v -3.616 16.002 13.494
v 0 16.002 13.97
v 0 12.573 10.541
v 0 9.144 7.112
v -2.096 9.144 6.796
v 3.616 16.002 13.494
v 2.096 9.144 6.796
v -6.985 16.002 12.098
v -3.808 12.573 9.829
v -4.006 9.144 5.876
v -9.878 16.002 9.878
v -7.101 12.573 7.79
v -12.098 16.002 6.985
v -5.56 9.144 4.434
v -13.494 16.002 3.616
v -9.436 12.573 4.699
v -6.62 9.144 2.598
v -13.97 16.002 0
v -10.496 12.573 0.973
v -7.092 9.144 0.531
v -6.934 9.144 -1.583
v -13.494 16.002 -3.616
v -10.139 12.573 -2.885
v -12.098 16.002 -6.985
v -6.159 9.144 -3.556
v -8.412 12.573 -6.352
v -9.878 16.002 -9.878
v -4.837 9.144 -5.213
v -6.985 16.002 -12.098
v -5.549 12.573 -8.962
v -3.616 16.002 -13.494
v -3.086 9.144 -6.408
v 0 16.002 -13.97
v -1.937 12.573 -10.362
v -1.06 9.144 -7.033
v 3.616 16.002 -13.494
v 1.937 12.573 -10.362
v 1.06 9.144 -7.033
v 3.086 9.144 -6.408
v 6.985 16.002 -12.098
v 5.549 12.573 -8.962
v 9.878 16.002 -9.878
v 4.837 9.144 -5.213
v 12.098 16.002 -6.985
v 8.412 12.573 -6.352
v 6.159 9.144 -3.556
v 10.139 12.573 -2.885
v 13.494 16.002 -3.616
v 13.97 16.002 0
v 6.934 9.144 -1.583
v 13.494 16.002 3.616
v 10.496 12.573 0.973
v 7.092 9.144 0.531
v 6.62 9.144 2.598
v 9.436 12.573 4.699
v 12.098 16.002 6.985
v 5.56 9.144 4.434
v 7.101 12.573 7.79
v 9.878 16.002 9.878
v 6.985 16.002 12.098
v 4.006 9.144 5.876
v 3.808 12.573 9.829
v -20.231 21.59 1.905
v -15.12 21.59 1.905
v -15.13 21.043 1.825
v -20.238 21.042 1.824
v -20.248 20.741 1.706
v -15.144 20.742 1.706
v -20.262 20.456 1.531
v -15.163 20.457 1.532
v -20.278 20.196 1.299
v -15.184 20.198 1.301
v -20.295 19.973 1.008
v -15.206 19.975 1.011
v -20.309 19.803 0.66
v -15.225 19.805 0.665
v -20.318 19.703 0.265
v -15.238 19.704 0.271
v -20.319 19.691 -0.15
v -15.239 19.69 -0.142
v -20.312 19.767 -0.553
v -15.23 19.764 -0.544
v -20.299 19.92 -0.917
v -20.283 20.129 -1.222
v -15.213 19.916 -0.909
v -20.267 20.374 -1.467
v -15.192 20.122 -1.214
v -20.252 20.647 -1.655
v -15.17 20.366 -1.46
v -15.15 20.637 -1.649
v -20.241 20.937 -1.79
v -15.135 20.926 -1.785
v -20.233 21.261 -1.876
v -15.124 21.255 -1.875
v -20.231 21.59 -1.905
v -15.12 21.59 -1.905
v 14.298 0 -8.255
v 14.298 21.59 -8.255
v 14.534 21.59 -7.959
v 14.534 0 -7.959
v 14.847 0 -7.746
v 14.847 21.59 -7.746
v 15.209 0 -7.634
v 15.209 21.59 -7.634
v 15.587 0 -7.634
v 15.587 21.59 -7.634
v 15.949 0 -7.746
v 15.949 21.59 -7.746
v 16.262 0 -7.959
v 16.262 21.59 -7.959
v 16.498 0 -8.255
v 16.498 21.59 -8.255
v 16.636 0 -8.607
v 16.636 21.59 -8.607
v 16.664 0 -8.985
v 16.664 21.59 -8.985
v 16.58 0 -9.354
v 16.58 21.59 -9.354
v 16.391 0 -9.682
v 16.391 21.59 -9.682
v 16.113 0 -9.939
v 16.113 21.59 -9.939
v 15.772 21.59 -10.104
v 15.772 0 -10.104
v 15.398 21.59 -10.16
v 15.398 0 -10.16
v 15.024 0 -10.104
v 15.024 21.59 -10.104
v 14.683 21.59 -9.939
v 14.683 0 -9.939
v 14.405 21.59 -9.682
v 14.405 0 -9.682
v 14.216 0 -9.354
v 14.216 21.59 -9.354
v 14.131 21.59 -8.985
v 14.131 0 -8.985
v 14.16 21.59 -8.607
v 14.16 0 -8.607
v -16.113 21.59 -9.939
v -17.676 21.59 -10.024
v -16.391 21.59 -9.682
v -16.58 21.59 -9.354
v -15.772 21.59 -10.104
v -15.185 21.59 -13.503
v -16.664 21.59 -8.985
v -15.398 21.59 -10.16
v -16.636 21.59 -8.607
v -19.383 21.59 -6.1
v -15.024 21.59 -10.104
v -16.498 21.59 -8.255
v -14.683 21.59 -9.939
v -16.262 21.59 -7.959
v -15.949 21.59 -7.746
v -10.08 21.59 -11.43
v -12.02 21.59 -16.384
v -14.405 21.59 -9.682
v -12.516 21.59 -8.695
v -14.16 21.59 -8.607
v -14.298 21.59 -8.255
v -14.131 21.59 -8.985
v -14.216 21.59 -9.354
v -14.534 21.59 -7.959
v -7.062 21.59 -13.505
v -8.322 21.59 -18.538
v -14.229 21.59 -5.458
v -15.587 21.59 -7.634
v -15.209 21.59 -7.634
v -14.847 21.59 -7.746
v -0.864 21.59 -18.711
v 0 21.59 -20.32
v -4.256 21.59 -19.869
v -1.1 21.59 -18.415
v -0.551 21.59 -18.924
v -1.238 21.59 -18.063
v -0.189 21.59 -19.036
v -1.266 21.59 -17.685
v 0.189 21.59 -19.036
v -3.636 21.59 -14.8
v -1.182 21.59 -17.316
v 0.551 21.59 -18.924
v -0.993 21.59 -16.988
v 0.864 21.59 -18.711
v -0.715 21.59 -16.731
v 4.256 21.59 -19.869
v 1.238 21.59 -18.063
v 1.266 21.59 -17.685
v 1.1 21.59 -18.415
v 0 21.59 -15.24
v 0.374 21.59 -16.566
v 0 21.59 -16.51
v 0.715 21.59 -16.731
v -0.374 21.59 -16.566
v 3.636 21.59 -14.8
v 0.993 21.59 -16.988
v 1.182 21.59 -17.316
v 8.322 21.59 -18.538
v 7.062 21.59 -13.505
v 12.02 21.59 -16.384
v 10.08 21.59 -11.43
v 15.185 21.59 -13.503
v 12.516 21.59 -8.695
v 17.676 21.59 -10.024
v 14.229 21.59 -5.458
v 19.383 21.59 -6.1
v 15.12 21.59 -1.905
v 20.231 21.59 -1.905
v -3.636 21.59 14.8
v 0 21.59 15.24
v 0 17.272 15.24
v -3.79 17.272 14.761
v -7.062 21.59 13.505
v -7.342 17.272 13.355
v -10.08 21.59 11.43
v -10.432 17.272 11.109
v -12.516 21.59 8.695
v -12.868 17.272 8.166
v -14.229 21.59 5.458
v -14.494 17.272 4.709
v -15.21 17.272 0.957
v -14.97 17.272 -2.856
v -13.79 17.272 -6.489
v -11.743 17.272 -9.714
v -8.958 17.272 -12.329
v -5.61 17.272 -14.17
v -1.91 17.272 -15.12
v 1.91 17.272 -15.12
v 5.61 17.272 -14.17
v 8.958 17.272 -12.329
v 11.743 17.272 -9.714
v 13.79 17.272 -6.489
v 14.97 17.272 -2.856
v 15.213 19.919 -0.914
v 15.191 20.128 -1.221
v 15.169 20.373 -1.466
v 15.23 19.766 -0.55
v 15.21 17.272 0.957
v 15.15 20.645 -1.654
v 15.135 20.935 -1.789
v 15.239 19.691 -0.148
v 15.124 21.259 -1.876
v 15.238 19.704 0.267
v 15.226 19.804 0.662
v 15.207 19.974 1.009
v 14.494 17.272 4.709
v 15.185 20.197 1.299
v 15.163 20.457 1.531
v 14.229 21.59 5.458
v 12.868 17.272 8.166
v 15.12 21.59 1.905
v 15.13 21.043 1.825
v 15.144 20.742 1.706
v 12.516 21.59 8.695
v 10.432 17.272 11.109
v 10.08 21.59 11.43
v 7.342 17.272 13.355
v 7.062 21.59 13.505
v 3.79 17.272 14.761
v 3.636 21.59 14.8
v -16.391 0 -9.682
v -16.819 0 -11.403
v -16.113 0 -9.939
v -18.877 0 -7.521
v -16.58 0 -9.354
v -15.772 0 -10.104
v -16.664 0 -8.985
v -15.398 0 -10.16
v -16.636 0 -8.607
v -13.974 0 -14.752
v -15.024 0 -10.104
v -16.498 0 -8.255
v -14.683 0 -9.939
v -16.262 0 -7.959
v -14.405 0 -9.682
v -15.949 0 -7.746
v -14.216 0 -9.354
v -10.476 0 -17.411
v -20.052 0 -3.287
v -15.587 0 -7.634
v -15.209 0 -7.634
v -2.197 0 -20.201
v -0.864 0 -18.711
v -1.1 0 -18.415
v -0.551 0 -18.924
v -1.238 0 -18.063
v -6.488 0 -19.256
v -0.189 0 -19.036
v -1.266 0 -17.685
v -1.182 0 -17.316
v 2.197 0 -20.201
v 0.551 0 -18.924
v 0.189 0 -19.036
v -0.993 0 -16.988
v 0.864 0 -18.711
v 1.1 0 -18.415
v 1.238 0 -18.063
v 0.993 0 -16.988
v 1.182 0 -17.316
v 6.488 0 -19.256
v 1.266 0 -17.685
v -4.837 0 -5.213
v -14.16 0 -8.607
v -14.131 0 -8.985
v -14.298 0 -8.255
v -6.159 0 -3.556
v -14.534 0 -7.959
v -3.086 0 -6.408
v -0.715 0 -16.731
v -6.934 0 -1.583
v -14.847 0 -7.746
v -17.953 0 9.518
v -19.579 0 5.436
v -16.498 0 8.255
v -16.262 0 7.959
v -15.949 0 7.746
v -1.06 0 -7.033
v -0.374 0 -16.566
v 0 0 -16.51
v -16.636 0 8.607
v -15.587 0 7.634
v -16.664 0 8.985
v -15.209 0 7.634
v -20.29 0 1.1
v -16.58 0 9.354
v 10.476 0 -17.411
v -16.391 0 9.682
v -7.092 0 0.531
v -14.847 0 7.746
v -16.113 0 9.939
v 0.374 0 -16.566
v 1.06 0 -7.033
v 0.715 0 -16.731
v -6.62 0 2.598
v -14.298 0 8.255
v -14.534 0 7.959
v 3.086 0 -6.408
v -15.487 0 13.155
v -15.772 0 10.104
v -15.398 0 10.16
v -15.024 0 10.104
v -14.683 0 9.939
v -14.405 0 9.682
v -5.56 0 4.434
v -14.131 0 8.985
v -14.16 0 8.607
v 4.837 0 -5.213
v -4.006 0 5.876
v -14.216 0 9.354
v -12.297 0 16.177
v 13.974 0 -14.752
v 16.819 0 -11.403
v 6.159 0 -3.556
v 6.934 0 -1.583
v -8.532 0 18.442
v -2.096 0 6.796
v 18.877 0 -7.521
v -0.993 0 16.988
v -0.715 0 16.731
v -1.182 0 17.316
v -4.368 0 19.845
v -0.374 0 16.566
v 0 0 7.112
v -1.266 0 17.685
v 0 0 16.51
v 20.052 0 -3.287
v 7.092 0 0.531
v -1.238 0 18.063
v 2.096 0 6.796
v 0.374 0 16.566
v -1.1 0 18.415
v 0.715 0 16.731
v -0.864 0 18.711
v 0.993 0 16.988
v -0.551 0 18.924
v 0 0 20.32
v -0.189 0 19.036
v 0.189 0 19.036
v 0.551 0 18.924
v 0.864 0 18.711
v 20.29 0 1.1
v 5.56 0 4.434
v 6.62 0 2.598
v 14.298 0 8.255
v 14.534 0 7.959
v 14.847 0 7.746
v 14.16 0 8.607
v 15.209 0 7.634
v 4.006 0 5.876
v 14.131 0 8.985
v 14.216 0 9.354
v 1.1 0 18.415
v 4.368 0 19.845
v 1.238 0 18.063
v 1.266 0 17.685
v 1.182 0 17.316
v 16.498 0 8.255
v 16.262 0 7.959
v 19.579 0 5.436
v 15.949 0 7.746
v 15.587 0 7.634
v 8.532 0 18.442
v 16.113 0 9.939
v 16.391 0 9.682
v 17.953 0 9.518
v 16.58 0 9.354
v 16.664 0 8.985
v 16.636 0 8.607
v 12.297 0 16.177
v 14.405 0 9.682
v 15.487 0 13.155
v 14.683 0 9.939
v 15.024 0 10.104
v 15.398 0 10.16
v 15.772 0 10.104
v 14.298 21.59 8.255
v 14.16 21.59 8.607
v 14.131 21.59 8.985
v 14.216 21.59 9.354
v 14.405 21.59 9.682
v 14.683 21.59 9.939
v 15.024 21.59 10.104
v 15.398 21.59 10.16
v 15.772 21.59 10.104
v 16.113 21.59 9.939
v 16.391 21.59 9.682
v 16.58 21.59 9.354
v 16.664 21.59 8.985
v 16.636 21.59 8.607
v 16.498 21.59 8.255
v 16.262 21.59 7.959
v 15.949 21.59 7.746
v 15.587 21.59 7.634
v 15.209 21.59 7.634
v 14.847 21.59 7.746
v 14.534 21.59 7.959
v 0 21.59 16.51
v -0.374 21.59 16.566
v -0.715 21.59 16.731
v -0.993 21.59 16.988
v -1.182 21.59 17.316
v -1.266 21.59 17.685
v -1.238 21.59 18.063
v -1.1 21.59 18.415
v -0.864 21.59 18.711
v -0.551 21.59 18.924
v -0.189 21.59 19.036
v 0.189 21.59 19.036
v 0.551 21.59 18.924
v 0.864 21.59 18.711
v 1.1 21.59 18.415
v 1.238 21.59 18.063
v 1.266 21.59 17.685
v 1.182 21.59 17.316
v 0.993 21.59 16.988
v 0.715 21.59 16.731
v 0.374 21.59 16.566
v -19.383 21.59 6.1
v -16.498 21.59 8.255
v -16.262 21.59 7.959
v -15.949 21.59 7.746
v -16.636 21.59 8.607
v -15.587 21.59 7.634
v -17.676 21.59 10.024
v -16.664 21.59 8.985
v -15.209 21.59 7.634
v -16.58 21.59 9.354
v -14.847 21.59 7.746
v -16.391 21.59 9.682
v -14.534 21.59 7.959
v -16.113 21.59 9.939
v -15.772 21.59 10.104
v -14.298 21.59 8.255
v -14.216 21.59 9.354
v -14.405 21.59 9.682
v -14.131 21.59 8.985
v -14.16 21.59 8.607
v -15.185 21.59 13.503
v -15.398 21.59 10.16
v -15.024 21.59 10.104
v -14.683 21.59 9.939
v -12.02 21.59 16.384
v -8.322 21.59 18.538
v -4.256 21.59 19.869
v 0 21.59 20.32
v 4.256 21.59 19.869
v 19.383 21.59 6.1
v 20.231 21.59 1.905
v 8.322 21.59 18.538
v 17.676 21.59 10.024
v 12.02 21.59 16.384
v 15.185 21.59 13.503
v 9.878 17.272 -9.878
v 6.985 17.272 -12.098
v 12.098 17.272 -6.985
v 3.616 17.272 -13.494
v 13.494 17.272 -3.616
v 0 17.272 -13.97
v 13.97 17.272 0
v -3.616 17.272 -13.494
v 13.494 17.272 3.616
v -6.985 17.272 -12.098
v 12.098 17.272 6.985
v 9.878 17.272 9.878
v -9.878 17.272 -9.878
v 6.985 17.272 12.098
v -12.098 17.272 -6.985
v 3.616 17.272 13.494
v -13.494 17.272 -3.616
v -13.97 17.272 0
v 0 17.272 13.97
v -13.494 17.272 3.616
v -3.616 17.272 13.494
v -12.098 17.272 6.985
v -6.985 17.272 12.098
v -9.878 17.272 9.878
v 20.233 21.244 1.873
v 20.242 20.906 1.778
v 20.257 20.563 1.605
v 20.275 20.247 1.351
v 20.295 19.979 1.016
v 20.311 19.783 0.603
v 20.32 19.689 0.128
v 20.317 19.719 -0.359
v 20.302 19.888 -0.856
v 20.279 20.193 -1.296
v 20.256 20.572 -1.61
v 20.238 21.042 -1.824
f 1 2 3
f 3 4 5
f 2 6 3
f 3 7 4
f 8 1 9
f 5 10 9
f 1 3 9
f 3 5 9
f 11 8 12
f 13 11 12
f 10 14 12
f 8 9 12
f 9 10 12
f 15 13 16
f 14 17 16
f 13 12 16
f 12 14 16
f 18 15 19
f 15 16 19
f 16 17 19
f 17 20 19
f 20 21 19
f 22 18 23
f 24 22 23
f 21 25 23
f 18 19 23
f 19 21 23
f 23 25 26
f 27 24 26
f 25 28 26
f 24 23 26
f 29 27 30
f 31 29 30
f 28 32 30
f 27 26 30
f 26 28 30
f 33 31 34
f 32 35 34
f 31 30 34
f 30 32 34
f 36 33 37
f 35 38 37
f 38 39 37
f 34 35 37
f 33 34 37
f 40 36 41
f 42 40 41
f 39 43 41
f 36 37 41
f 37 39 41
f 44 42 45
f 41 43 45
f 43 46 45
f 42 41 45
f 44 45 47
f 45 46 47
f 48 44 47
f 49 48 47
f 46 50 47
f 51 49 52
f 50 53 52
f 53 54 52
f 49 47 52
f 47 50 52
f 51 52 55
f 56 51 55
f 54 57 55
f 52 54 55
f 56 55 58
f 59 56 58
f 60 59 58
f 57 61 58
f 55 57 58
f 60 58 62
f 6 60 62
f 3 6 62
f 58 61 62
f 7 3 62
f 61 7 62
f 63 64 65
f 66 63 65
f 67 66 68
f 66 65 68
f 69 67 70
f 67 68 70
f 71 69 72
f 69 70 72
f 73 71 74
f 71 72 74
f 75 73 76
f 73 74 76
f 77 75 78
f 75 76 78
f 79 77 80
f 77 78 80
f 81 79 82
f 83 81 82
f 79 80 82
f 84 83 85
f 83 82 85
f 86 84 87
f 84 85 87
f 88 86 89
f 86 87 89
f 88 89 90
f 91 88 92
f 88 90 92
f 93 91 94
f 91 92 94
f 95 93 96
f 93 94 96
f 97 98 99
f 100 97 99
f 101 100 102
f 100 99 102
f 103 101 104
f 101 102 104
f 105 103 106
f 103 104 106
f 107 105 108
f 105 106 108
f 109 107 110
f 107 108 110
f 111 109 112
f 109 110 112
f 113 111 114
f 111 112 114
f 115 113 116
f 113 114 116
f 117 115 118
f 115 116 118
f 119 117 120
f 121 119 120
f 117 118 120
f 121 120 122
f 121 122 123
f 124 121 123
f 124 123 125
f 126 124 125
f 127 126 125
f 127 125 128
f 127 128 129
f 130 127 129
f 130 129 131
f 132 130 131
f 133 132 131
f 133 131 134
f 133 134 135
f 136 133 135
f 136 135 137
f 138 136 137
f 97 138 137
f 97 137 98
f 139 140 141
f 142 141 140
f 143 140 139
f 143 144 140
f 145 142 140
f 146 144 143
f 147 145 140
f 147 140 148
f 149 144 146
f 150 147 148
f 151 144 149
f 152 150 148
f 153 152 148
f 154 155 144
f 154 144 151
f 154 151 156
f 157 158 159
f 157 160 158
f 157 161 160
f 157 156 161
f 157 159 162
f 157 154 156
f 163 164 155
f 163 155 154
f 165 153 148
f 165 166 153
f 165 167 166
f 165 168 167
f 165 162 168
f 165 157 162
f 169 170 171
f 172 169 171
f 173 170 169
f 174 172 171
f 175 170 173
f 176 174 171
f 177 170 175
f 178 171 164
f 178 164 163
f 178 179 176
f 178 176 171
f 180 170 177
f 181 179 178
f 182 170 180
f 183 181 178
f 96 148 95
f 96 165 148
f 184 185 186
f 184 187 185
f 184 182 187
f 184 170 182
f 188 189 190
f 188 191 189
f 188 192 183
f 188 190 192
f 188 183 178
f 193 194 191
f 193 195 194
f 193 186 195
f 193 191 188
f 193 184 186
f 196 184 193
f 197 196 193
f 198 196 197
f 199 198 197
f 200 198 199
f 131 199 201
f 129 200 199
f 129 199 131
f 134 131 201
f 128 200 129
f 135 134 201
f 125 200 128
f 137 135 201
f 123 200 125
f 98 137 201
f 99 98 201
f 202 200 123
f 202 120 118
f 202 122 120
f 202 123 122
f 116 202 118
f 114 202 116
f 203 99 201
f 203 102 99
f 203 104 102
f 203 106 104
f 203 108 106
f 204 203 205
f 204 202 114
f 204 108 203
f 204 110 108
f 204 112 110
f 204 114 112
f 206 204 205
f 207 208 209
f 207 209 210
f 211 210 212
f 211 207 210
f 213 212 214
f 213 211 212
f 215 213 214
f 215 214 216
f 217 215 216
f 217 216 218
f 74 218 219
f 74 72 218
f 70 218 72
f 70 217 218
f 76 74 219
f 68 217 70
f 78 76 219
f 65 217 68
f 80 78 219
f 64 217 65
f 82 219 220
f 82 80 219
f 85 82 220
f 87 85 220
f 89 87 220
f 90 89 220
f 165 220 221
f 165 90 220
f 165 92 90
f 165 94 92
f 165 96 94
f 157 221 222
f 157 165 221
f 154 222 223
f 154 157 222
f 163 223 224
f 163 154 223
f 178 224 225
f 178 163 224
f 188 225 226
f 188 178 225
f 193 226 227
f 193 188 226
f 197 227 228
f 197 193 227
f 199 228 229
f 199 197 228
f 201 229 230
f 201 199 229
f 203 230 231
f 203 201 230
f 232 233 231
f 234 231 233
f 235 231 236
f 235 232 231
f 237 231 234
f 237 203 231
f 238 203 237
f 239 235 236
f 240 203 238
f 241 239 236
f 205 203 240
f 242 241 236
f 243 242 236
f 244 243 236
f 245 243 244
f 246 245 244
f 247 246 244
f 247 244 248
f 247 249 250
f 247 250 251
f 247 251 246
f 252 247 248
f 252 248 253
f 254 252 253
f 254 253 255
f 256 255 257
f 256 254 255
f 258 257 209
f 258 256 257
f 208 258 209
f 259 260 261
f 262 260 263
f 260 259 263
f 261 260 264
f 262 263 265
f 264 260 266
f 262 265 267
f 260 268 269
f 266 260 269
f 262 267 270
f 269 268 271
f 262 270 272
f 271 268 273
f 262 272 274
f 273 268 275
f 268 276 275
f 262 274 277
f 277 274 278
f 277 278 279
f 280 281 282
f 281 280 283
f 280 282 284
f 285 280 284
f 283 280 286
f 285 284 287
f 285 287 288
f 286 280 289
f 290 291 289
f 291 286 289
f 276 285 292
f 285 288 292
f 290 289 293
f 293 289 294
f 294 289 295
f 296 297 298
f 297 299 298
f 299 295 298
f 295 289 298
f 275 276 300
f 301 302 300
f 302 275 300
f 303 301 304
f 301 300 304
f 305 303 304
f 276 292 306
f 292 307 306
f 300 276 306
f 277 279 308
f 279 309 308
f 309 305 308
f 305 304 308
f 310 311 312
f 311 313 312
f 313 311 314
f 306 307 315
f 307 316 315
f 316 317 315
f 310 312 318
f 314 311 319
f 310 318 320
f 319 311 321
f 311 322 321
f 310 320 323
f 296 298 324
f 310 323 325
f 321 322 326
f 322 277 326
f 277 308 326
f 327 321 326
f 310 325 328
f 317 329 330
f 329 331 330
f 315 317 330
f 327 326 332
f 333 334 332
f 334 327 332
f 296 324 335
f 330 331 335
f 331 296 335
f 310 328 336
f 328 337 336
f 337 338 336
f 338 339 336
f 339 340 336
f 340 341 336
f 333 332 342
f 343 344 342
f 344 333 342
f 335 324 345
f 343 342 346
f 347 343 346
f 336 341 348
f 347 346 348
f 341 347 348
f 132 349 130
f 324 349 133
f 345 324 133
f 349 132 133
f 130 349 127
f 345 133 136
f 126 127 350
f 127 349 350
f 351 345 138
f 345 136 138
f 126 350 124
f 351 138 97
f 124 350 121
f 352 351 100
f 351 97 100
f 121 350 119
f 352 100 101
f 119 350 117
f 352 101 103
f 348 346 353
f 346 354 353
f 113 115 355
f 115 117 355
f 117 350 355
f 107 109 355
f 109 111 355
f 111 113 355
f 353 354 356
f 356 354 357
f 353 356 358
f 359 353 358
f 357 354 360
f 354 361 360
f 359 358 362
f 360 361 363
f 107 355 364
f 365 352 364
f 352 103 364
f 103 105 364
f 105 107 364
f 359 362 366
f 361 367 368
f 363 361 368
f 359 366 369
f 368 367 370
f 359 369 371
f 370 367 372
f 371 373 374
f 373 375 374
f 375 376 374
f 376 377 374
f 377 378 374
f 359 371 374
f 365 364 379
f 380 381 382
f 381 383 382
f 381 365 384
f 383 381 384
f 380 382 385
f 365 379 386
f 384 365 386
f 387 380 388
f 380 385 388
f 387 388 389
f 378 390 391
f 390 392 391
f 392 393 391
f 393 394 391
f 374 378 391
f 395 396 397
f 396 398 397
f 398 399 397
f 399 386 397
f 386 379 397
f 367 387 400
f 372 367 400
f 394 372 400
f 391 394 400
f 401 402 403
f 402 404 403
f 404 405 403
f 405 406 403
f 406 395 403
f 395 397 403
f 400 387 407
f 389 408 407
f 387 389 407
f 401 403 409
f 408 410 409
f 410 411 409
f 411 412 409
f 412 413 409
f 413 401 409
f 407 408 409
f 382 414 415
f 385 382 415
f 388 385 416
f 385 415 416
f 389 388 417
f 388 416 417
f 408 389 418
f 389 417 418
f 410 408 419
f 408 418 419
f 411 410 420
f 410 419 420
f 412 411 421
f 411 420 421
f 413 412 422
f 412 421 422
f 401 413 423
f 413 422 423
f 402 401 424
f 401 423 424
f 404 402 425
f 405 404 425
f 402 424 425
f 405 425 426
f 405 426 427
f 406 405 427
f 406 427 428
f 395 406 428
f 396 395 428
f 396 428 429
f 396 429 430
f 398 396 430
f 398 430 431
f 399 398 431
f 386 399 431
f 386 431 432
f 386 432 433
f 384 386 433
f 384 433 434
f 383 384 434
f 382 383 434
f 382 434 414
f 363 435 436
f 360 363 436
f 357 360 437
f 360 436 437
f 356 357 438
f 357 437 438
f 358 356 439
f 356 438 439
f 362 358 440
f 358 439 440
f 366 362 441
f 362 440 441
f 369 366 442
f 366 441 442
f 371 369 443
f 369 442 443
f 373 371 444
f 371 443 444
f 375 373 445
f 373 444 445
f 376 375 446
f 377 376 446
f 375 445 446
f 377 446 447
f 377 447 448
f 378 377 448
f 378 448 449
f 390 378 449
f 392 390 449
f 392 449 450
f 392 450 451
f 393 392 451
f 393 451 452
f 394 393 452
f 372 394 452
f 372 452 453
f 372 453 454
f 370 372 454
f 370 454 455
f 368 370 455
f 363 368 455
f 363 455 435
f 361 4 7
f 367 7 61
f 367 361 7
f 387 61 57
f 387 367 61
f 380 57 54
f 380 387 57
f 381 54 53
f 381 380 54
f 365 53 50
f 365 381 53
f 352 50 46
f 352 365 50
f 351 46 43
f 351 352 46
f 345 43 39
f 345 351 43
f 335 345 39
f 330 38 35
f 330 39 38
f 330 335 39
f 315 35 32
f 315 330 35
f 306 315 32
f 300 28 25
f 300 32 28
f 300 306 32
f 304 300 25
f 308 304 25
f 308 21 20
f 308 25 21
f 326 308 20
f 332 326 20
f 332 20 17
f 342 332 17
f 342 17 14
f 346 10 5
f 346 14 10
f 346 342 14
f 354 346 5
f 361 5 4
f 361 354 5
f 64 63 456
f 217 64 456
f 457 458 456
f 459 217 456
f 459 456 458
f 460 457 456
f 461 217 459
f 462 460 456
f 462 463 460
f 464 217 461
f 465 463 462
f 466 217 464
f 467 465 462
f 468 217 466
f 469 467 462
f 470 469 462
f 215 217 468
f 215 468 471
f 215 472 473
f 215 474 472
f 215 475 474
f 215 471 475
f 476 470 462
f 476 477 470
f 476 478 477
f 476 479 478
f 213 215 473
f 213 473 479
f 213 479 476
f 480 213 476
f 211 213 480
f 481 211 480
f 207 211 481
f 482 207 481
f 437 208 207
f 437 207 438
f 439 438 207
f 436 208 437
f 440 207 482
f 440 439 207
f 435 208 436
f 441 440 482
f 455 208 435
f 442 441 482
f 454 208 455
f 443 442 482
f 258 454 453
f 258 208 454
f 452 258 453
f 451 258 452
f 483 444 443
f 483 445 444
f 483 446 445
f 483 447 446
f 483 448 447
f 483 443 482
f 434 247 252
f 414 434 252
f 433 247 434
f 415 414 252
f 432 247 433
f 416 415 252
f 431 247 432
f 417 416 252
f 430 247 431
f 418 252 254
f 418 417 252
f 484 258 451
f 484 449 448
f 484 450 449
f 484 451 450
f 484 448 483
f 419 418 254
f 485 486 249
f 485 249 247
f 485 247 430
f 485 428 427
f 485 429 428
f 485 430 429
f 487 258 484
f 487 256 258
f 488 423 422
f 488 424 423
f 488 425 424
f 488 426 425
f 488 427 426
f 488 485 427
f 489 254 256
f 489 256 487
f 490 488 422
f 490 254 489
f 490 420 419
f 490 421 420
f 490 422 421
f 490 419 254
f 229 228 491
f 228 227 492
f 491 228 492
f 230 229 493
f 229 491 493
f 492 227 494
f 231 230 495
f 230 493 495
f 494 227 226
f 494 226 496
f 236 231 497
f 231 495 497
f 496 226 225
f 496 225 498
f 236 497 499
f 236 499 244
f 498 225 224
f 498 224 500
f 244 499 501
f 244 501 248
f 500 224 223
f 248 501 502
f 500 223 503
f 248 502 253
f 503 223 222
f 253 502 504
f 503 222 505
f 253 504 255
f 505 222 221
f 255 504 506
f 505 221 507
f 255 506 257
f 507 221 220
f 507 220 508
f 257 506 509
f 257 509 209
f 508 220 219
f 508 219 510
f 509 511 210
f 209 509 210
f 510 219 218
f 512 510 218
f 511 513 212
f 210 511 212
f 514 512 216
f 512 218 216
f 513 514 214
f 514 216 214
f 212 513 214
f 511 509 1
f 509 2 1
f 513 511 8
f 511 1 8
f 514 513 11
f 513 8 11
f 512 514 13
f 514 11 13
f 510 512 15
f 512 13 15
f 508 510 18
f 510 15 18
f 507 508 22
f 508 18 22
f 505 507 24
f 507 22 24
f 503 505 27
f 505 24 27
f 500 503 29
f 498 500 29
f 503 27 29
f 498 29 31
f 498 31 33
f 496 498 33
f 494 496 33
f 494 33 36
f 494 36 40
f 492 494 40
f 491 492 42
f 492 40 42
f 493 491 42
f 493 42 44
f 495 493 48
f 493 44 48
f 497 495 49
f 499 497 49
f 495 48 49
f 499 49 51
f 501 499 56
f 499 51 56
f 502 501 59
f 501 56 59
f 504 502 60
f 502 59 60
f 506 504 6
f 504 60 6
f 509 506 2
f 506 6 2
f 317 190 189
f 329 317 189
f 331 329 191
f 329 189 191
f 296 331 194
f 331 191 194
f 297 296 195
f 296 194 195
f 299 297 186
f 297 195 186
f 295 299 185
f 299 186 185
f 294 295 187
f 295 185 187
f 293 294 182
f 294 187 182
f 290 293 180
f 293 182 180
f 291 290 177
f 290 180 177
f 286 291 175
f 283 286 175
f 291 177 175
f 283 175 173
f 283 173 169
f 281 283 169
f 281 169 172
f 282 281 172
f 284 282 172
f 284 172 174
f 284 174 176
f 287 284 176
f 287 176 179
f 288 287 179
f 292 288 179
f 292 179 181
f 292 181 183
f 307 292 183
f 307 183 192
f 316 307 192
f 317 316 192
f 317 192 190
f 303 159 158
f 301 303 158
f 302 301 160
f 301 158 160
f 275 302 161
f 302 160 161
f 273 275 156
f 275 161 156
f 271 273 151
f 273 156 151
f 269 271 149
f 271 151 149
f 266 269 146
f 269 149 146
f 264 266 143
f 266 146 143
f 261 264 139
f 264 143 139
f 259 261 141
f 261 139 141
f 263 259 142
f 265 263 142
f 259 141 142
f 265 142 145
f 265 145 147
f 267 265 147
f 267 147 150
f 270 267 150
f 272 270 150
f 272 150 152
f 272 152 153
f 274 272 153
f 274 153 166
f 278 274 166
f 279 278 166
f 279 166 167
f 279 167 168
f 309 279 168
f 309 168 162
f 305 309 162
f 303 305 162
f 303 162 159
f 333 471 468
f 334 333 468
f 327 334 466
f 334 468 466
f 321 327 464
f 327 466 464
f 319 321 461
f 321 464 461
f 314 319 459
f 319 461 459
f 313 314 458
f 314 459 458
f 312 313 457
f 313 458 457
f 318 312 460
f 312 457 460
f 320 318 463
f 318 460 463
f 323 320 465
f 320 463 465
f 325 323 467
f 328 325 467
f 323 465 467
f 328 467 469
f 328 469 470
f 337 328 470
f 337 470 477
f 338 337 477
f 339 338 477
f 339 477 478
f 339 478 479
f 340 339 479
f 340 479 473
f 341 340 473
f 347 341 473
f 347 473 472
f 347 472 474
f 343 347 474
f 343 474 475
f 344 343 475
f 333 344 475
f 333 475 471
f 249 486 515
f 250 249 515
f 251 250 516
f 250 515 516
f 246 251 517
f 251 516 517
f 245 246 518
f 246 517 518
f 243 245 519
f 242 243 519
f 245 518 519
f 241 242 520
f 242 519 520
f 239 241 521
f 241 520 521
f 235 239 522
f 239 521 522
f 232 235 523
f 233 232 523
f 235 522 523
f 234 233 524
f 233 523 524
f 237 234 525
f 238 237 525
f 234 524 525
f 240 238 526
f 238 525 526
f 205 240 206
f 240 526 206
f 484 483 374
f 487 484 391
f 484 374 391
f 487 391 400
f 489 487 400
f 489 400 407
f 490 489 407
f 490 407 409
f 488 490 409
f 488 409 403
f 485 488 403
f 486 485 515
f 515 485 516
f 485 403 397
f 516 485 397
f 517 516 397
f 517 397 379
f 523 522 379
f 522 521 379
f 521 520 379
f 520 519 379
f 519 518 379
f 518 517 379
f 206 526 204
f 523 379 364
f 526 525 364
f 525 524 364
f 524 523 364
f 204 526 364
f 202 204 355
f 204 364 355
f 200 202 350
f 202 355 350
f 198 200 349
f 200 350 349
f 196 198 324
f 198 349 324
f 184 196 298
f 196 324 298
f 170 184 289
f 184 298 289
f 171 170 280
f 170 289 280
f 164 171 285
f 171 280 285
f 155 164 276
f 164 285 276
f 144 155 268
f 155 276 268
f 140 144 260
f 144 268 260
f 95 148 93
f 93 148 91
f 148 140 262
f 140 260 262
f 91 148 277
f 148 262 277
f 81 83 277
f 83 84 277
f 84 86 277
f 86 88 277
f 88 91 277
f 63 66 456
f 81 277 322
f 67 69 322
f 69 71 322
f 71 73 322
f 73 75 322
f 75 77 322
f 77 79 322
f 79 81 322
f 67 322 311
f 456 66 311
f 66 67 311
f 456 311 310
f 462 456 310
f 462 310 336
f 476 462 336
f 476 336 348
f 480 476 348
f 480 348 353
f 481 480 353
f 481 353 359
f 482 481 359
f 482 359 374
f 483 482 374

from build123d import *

# Parameters (mm, degrees)
SKETCH1_R           = 20.32
BOSS_EXTRUDE1_DEPTH = 21.59
SKETCH2_W           = 15.24
SKETCH2_H           = 4.318
CUT_EXTRUDE1_REACH  = 37.943
SKETCH4_R           = 1.27
CIRPATTERN1_COUNT   = 6
SKETCH9_R           = 1.905
CUT_EXTRUDE3_DEPTH  = 51.305467894
SKETCH10_R          = 7.112
CUT_EXTRUDE8_DEPTH  = 17.272


with BuildPart() as part:
    # Sketch1 → Boss-Extrude1 (new body)
    with BuildSketch(Plane(origin=(0, 0, 0), x_dir=(1, 0, 0), z_dir=(0, 1, 0))):
        with Locations(Location((0, 0, 0), (0, 0, 270))):
            Circle(SKETCH1_R)
    extrude(amount=BOSS_EXTRUDE1_DEPTH)

    # Sketch2 → Cut-Revolve1 (revolve, cut)
    with BuildSketch(Plane.XY, mode=Mode.PRIVATE) as cut_revolve1_sk:
        with Locations((-7.62, 19.431)):
            Rectangle(SKETCH2_W, SKETCH2_H)
    revolve(cut_revolve1_sk.sketch.rotate(Axis((0, 22.78347084, 0), (0, -1, 0)), 270), axis=Axis((0, 22.78347084, 0), (0, -1, 0)), mode=Mode.SUBTRACT)

    # Sketch4 → Cut-Extrude1 (cut, up to next)
    with BuildSketch(Plane(origin=(0, 21.59, 0), x_dir=(1, 0, 0), z_dir=(0, 1, 0)), mode=Mode.PRIVATE) as cut_extrude1_sk1:
        with Locations(Location((0, 17.78, 0), (0, 0, 270))):
            Circle(SKETCH4_R)
    cut_extrude1_tool1 = extrude(cut_extrude1_sk1.sketch, amount=-CUT_EXTRUDE1_REACH, mode=Mode.PRIVATE) & part.part
    cut_extrude1 = cut_extrude1_tool1.solids().sort_by_distance((0, 21.59, -17.78))[0]
    add(cut_extrude1, mode=Mode.SUBTRACT)

    # CirPattern1: Cut-Extrude1 ×6 about axis
    cirpattern1_axis = Axis((0, 0, 0), (0, 1, 0))
    for i in range(1, CIRPATTERN1_COUNT):
        add(cut_extrude1.rotate(cirpattern1_axis, i * 360 / CIRPATTERN1_COUNT), mode=Mode.SUBTRACT)

    # Sketch8 → Cut-Revolve4 (revolve, cut)
    with BuildSketch(Plane.XY, mode=Mode.PRIVATE) as cut_revolve4_sk:
        Polygon((-4.699, 17.272), (-13.97, 17.272), (-13.97, 16.002), (-4.699, 6.731), align=None)
    revolve(cut_revolve4_sk.sketch.rotate(Axis((0, 22.78347084, 0), (0, -1, 0)), 270), axis=Axis((0, 22.78347084, 0), (0, -1, 0)), mode=Mode.SUBTRACT)

    # Sketch9 → Cut-Extrude3 (cut, through all)
    with BuildSketch(Plane(origin=(20.32, 0, 0), x_dir=(0, 0, -1), z_dir=(1, 0, 0))):
        with Locations((0, 21.59)):
            Circle(SKETCH9_R)
    extrude(amount=-CUT_EXTRUDE3_DEPTH, mode=Mode.SUBTRACT)

    # Sketch10 → Cut-Extrude8 (cut)
    with BuildSketch(Plane(origin=(0, 0, 0), x_dir=(1, 0, 0), z_dir=(0, 1, 0))):
        with Locations(Location((0, 0, 0), (0, 0, 270))):
            Circle(SKETCH10_R)
    extrude(amount=CUT_EXTRUDE8_DEPTH, mode=Mode.SUBTRACT)


solid = part.part
